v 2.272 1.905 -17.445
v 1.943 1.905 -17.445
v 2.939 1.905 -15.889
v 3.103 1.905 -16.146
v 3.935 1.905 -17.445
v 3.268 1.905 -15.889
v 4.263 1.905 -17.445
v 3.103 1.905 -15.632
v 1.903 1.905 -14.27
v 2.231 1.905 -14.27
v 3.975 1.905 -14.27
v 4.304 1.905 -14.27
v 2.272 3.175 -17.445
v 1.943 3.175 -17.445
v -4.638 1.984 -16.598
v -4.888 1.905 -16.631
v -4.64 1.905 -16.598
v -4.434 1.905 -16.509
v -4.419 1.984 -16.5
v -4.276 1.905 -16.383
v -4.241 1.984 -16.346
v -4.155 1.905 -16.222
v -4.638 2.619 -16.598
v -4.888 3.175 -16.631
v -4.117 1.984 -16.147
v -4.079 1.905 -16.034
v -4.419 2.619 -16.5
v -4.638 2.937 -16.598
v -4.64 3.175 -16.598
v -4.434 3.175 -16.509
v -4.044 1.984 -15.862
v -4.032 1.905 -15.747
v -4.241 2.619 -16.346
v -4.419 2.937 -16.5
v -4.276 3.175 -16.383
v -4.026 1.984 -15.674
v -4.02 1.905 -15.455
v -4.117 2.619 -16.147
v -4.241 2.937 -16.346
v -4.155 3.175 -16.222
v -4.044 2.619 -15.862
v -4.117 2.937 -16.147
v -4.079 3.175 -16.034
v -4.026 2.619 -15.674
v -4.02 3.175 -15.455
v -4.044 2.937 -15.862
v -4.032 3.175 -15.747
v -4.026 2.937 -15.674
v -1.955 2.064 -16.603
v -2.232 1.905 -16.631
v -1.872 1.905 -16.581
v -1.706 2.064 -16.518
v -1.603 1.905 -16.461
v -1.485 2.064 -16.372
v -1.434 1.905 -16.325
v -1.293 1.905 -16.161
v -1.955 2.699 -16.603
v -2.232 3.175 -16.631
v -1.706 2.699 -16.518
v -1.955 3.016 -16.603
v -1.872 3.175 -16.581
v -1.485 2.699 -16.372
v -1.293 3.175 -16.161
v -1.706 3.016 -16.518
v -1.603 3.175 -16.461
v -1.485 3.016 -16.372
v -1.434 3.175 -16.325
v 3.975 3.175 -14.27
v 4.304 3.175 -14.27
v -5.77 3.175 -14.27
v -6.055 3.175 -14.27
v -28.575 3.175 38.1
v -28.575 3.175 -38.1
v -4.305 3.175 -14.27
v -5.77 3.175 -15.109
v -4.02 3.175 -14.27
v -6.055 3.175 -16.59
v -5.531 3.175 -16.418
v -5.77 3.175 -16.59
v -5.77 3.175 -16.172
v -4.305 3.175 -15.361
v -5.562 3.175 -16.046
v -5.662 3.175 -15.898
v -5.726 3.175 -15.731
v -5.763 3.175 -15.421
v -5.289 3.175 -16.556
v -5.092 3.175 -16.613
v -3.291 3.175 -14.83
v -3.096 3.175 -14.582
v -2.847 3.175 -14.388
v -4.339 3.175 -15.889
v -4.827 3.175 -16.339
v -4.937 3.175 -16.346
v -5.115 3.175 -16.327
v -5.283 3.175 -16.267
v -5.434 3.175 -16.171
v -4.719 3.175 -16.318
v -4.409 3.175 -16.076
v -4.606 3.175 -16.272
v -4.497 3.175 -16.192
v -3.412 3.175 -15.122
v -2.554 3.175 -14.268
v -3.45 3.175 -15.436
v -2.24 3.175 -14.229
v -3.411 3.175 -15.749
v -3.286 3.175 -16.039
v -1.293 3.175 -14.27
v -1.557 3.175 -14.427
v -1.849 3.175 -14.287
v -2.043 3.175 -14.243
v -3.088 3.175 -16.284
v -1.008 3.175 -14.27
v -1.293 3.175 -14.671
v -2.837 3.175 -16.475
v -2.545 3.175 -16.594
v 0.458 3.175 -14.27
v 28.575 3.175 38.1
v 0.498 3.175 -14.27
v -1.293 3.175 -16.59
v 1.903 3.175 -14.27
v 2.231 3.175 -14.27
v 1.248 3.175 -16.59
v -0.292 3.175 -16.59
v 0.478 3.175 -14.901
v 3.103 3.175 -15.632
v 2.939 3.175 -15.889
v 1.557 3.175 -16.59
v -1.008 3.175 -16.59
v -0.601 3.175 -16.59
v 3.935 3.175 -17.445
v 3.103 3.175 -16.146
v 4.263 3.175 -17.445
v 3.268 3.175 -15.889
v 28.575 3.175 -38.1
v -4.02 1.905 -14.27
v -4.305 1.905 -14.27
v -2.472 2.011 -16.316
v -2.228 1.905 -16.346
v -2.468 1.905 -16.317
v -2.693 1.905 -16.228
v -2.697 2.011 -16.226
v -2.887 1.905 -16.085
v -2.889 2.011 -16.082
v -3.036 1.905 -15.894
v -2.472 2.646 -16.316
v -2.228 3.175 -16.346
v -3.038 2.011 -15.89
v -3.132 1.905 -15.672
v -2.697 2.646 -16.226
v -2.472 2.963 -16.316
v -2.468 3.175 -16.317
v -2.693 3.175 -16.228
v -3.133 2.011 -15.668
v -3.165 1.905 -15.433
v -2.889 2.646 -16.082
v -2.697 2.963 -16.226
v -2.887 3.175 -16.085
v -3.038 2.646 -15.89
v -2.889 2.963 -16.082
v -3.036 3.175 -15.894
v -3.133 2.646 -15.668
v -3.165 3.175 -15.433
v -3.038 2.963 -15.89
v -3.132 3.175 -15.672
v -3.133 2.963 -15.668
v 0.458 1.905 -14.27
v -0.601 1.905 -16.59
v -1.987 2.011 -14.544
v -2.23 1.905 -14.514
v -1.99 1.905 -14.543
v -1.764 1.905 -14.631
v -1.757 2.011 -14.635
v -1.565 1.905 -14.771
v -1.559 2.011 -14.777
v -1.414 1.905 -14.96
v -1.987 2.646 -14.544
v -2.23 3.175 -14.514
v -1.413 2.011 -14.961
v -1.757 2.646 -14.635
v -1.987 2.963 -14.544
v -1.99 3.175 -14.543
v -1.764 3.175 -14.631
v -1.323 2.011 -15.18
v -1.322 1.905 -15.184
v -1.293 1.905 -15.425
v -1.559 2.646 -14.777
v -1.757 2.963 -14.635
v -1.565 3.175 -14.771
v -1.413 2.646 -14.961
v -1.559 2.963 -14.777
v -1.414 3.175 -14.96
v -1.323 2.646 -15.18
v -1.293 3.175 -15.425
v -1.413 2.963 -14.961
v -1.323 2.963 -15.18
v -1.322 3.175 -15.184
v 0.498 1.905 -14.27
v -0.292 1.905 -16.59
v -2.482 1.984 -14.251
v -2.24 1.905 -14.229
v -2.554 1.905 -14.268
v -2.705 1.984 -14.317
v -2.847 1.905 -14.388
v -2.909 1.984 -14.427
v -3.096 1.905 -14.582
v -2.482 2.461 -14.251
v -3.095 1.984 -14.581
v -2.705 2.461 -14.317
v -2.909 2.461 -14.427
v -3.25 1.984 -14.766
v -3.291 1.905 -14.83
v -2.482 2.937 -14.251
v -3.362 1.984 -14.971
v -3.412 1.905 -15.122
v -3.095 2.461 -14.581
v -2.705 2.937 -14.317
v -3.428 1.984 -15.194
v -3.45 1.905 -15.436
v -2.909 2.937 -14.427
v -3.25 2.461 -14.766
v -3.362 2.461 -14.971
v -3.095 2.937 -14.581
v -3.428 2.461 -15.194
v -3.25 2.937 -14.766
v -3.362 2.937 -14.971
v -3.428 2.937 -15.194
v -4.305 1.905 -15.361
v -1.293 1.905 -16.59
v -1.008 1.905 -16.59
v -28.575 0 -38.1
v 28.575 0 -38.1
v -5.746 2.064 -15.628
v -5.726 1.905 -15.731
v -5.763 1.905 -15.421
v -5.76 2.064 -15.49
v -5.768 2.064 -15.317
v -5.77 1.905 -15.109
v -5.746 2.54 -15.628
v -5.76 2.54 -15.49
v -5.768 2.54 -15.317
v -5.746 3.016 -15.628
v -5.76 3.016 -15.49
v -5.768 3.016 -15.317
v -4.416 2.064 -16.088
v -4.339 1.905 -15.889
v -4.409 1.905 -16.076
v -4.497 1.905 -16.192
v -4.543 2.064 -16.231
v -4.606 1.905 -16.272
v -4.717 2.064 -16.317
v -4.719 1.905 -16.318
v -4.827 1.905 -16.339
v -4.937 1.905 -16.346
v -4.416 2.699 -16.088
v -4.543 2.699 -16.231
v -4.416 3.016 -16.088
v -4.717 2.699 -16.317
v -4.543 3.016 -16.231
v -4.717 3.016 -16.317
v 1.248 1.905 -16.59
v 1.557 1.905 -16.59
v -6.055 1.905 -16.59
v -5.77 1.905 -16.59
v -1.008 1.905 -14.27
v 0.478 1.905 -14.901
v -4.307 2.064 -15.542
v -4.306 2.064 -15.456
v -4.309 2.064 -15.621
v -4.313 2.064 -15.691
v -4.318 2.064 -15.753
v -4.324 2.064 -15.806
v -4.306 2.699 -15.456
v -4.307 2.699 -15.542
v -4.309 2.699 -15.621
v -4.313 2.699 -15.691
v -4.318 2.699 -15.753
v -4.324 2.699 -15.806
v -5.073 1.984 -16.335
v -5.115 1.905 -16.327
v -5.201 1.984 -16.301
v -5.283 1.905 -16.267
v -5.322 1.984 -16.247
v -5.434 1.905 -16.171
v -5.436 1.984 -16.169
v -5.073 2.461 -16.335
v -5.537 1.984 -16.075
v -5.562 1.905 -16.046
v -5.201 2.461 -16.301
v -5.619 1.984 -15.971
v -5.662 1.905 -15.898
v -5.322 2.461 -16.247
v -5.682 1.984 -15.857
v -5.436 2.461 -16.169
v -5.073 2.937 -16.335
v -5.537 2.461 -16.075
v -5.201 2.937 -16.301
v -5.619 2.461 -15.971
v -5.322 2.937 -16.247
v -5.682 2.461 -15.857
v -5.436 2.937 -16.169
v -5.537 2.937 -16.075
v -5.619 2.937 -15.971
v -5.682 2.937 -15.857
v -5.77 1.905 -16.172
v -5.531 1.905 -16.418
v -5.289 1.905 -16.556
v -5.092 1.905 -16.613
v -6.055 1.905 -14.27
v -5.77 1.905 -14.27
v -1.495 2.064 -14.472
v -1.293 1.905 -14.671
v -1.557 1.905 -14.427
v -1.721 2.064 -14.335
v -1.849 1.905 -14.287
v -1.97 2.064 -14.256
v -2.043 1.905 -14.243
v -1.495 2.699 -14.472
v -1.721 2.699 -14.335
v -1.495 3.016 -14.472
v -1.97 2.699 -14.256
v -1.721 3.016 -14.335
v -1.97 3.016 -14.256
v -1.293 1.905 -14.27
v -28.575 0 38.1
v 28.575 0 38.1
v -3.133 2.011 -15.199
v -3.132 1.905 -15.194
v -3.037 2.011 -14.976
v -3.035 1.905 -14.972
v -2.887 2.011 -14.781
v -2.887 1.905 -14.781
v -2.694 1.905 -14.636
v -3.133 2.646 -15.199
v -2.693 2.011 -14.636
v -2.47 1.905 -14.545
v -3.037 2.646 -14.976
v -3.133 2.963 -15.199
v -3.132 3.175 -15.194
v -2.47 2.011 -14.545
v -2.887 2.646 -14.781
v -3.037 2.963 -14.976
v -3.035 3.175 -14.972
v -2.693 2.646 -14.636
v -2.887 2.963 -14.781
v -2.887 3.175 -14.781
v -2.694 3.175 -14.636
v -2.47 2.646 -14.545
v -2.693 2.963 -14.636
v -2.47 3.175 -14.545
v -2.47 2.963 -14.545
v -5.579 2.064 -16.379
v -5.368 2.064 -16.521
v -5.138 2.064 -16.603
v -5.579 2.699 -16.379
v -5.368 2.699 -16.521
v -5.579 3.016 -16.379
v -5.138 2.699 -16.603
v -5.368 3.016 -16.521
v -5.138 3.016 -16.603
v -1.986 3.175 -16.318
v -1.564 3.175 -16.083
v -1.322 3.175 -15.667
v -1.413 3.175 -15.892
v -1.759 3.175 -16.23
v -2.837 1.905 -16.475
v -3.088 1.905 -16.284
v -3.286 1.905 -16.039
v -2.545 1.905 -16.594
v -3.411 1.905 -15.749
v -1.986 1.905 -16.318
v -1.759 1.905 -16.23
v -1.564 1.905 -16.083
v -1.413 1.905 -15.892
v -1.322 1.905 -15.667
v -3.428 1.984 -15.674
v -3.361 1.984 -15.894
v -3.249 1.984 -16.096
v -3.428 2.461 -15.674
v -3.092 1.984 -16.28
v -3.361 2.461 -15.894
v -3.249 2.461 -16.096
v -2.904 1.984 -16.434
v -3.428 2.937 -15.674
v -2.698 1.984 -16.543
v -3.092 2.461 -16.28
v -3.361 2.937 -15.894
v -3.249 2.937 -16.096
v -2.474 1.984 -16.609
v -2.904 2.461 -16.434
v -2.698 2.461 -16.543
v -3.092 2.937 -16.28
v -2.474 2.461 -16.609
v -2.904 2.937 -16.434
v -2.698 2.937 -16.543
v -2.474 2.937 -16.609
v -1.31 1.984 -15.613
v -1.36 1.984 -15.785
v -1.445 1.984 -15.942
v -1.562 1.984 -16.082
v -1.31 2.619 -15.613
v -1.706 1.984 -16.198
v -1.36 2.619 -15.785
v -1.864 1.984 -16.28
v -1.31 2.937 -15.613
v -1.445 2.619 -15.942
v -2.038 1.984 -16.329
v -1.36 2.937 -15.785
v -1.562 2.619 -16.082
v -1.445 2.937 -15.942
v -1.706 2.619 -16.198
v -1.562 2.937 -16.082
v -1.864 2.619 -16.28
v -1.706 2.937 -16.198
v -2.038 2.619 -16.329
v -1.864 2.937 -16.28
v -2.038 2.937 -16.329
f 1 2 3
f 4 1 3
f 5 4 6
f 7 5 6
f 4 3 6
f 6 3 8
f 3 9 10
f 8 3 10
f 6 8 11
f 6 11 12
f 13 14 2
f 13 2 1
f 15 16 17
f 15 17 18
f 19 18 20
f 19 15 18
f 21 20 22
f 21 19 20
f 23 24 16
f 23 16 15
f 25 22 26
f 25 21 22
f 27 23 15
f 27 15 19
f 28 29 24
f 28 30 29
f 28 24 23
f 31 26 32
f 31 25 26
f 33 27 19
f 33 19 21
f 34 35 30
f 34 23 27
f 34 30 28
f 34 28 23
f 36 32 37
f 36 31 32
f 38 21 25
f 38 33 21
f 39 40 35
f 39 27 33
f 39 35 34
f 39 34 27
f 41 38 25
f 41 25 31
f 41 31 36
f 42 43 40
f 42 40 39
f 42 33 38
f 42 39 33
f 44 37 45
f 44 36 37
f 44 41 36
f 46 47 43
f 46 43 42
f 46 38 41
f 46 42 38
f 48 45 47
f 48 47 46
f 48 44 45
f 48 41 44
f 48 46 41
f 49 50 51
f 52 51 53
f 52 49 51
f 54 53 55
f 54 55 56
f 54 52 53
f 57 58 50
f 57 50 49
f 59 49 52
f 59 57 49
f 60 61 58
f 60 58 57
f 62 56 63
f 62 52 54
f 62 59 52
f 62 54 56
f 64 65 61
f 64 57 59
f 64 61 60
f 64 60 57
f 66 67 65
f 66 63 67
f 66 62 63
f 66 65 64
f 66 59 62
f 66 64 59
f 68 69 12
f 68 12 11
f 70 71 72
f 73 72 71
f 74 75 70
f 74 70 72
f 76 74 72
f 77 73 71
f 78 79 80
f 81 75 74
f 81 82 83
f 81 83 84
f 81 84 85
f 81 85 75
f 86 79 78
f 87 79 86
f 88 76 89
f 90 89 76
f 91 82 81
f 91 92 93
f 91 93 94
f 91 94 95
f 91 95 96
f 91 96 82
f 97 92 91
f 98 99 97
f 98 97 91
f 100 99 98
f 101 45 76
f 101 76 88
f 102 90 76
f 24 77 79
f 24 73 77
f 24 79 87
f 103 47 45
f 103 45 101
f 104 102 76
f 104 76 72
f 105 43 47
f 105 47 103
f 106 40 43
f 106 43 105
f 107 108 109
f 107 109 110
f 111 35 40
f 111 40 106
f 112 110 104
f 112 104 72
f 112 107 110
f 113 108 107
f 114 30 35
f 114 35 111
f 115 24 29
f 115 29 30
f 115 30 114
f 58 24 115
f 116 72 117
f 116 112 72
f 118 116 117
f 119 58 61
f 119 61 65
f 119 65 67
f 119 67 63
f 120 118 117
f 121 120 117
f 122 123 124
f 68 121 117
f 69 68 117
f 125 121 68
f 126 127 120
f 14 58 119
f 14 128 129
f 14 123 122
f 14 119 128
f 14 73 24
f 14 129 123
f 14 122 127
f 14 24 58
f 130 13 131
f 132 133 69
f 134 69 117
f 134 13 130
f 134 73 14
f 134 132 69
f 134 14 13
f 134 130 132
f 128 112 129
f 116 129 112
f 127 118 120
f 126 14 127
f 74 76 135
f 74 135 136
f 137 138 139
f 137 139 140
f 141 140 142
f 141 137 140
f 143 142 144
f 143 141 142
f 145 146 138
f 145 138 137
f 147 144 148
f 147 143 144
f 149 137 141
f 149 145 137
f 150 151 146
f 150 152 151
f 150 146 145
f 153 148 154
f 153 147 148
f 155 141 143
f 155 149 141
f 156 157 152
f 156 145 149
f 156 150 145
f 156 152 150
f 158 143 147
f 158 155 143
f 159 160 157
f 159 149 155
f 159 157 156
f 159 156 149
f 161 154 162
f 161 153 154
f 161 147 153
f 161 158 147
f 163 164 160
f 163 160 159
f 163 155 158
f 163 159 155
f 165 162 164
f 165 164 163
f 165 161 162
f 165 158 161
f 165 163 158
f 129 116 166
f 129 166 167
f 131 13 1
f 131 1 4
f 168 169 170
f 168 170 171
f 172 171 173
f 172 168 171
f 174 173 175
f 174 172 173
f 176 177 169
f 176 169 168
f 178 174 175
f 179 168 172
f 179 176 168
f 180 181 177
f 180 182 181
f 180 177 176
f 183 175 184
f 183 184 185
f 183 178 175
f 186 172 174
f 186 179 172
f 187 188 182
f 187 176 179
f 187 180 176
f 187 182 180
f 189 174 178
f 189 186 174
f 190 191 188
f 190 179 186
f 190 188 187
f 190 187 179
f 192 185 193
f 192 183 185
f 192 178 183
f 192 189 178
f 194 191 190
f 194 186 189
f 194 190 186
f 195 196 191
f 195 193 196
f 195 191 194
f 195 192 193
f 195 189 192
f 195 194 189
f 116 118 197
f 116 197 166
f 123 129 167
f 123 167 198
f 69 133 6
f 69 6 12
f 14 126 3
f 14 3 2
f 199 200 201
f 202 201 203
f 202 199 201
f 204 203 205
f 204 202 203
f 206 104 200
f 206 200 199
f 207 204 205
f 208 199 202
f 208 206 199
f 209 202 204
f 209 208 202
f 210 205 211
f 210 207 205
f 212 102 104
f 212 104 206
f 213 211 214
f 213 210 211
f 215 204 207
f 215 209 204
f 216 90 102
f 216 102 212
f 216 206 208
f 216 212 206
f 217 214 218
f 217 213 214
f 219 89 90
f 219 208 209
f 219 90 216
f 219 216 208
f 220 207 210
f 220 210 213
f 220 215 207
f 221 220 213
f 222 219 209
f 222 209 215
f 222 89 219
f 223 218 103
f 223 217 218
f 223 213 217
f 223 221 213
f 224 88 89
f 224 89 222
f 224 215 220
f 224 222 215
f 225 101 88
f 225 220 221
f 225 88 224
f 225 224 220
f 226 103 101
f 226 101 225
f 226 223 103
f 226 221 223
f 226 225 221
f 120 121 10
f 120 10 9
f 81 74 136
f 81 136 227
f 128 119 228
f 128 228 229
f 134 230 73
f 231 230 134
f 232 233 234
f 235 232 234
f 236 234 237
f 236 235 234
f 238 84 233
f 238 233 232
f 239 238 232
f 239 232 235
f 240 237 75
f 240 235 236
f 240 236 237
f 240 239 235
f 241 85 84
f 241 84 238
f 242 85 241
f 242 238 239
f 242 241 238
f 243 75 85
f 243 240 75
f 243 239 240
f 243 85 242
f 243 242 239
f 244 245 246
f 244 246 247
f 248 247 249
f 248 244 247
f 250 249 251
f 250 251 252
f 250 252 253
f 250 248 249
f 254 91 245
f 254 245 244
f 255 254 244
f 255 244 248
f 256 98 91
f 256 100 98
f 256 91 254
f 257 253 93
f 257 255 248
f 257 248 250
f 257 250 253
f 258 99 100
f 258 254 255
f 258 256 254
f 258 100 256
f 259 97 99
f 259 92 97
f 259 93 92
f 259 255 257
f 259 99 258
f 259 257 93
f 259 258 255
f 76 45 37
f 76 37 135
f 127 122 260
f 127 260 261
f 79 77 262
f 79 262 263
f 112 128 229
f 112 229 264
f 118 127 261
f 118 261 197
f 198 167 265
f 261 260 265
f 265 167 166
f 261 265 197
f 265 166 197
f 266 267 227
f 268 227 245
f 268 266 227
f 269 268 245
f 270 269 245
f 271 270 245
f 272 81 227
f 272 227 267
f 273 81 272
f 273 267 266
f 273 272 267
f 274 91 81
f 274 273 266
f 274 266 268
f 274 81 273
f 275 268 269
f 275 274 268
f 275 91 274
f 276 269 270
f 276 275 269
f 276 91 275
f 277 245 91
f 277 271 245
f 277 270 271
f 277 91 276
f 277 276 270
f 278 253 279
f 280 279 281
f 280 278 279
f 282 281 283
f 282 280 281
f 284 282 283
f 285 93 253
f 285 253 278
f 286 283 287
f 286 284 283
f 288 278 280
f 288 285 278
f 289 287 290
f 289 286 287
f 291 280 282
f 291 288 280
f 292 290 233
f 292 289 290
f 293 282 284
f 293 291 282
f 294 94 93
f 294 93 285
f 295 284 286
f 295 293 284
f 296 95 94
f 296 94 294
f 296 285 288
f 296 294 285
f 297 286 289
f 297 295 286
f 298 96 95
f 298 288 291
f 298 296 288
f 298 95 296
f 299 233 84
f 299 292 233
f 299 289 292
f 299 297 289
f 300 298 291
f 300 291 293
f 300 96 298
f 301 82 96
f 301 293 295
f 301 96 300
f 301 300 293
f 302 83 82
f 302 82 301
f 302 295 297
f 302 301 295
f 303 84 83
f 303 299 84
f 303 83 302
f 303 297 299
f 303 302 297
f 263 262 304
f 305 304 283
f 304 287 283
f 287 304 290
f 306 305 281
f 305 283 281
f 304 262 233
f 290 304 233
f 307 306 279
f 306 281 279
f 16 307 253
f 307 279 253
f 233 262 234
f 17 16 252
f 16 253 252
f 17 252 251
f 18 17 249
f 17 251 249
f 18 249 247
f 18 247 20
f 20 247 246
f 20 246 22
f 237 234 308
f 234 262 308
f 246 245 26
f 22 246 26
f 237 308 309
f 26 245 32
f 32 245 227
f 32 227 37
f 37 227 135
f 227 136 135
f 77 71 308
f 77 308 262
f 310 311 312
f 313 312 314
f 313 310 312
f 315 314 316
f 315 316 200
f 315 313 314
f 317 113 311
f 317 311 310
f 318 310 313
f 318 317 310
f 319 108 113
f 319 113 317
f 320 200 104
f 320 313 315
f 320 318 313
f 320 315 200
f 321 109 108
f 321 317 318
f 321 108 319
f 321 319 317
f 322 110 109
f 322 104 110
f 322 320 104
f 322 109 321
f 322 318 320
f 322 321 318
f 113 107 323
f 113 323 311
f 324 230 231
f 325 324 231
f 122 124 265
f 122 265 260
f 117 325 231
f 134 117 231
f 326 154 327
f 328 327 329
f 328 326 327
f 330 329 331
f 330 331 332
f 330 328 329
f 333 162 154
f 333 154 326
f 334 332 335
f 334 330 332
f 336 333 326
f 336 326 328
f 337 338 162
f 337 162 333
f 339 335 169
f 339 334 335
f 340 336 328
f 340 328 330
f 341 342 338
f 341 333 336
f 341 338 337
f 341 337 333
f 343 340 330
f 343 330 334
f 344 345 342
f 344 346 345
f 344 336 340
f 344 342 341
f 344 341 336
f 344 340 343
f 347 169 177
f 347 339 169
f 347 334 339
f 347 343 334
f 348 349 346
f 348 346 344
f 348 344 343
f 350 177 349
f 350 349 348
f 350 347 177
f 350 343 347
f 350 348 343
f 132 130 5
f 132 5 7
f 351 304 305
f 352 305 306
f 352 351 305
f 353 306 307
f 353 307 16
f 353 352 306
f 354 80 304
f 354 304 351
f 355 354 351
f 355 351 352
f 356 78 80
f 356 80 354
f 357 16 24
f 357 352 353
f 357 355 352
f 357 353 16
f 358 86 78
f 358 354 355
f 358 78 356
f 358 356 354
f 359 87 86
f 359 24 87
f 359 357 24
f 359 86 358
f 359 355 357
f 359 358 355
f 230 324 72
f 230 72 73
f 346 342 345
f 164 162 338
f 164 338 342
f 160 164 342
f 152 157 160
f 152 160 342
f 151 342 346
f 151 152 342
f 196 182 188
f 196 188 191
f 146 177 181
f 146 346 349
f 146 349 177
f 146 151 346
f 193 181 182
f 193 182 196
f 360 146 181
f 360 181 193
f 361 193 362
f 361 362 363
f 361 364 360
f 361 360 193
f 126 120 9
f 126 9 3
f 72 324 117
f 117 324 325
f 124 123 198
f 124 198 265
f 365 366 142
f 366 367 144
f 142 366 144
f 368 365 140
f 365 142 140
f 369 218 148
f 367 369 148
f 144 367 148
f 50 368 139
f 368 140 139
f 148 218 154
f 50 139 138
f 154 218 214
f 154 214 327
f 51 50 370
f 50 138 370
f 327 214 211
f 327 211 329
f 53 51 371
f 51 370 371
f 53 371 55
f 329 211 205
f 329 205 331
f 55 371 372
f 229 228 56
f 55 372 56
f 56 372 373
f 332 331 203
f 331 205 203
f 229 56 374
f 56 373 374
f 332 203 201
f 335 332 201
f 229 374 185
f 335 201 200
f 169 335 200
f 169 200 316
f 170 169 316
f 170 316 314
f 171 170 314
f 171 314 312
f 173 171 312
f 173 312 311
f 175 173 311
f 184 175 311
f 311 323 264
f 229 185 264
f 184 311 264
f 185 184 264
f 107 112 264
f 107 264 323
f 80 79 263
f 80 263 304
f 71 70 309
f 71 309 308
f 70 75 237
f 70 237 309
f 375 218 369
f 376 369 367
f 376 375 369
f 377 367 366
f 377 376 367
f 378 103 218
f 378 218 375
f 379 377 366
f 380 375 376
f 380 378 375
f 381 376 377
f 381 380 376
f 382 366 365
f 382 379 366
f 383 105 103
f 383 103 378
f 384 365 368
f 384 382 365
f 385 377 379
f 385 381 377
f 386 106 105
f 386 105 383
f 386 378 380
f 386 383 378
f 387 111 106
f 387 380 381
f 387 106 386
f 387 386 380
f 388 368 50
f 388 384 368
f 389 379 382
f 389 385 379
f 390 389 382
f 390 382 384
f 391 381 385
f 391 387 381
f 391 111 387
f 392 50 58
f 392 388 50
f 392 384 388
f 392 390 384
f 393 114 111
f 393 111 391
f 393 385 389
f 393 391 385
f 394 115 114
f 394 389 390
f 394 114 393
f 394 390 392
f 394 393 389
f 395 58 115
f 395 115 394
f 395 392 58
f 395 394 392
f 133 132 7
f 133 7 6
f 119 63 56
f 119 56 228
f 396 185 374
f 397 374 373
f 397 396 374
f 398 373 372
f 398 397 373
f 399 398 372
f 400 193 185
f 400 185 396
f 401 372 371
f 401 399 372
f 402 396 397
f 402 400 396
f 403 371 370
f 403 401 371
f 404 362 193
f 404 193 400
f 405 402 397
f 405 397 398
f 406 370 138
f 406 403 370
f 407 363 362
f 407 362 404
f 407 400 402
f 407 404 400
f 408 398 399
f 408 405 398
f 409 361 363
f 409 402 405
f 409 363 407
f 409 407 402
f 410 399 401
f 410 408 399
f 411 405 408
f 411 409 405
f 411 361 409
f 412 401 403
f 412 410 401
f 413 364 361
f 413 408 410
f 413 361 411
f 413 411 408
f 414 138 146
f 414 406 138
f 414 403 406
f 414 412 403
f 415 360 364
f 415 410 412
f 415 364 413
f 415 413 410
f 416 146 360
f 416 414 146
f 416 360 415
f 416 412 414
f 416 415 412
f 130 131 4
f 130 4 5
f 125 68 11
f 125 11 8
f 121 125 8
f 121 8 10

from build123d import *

# Parameters (mm, degrees)
SKETCH1_W           = 57.15
SKETCH1_H           = 76.2
BOSS_EXTRUDE1_DEPTH = 3.175
CUT_EXTRUDE1_DEPTH  = 1.27


with BuildPart() as part:
    # Sketch1 → Boss-Extrude1 (new body)
    with BuildSketch(Plane(origin=(0, 0, 0), x_dir=(1, 0, 0), z_dir=(0, 1, 0))):
        Rectangle(SKETCH1_W, SKETCH1_H)
    extrude(amount=BOSS_EXTRUDE1_DEPTH)

    # Sketch2 → Cut-Extrude1 (cut)
    # profile 1 of 4: a face of its own
    with BuildSketch(Plane(origin=(0, 3.175, 0), x_dir=(-1, 0, 0), z_dir=(0, 1, 0))):
        with BuildLine():
            Line((6.055318585, -16.590002596), (5.770382688, -16.590002596))
            Line((5.770382688, -16.590002596), (5.770382688, -16.171502996))
            add(Edge.make_bspline(
                [(5.770382688, -16.171502996), (5.740011779, -16.209517079), (5.68116854, -16.283168869), (5.58216602, -16.379210072), (5.478935847, -16.459804005), (5.3698014, -16.523260139), (5.255885696, -16.571252171), (5.137511969, -16.605860082), (5.01403952, -16.626623661), (4.930069938, -16.629335713), (4.88759022, -16.630707724)],
                knots=[0, 0, 0, 0, 1.127869841, 2.185233117, 3.191641716, 4.159226741, 5.10472073, 6.052603964, 7.014823782, 8, 8, 8, 8], degree=3))
            add(Edge.make_bspline(
                [(4.88759022, -16.630707724), (4.844634079, -16.629214017), (4.760516404, -16.626289008), (4.638482352, -16.600515848), (4.523708355, -16.559729658), (4.417729129, -16.502406678), (4.322175382, -16.431236503), (4.239313996, -16.347753357), (4.169631782, -16.252962996), (4.123122139, -16.164236993), (4.093040195, -16.085425579), (4.073271524, -16.0180161), (4.057278247, -15.942883297), (4.04294765, -15.86021293), (4.033387568, -15.769672957), (4.025809426, -15.671479471), (4.020388991, -15.565649476), (4.020173366, -15.492455289), (4.020062175, -15.454711129)],
                knots=[0, 0, 0, 0, 1.235764162, 2.419900973, 3.574701258, 4.732869372, 5.875730734, 6.993815468, 8.107424371, 9.251605764, 9.866123335, 10.534503958, 11.272175692, 12.077112099, 12.949509943, 13.89253218, 14.913238789, 16, 16, 16, 16], degree=3))
            Line((4.020062175, -15.454711129), (4.020062175, -14.269810288))
            Line((4.020062175, -14.269810288), (4.304998072, -14.269810288))
            Line((4.304998072, -14.269810288), (4.304998072, -15.361216538))
            add(Edge.make_bspline(
                [(4.304998072, -15.361216538), (4.305172614, -15.392805516), (4.305506484, -15.453229854), (4.306573304, -15.539742593), (4.30908455, -15.617988608), (4.312758395, -15.688192769), (4.31790085, -15.750098127), (4.323405942, -15.804018032), (4.330082808, -15.849474875), (4.33603676, -15.876838879), (4.338707007, -15.889111169)],
                knots=[0, 0, 0, 0, 1.430803381, 2.736883362, 3.918614142, 4.976458302, 5.92063272, 6.731858525, 7.431260095, 8, 8, 8, 8], degree=3))
            add(Edge.make_bspline(
                [(4.338707007, -15.889111169), (4.348298036, -15.925160767), (4.366708706, -15.994360559), (4.413127221, -16.088064198), (4.470383963, -16.168488135), (4.541323753, -16.233978346), (4.624041324, -16.28496079), (4.718674187, -16.320307963), (4.824242938, -16.342422975), (4.898497037, -16.344624403), (4.937199595, -16.345771826)],
                knots=[0, 0, 0, 0, 1.084232, 2.08126119, 3.027460722, 3.945137793, 4.874029258, 5.839697328, 6.874011781, 8, 8, 8, 8], degree=3))
            add(Edge.make_bspline(
                [(4.937199595, -16.345771826), (4.960123112, -16.345346396), (5.005488159, -16.344504481), (5.072721891, -16.335837862), (5.13814421, -16.32215003), (5.201579846, -16.301932164), (5.263156997, -16.277350064), (5.323130484, -16.247186672), (5.380662305, -16.210701491), (5.436561438, -16.1696921), (5.488517318, -16.124022995), (5.537550393, -16.076530302), (5.580632017, -16.025225386), (5.619738091, -15.971922216), (5.653454407, -15.915550043), (5.682896587, -15.856711455), (5.707874702, -15.79531338), (5.720286952, -15.752700383), (5.726497471, -15.731378798)],
                knots=[0, 0, 0, 0, 1.023939463, 2.026349741, 3.024227553, 4.007104963, 4.997624259, 5.984875705, 7.002218968, 8.038748769, 9.079772093, 10.091408226, 11.086177727, 12.069739863, 13.043026652, 14.017557731, 15.008077027, 16, 16, 16, 16], degree=3))
            add(Edge.make_bspline(
                [(5.726497471, -15.731378798), (5.730071296, -15.715725863), (5.737851324, -15.681650245), (5.746254351, -15.62572995), (5.753881223, -15.561041615), (5.76026475, -15.487660728), (5.764170378, -15.40533037), (5.768428866, -15.314402145), (5.769979229, -15.214513481), (5.770244435, -15.144970374), (5.770382688, -15.10871754)],
                knots=[0, 0, 0, 0, 0.615963638, 1.340920617, 2.168419149, 3.115676021, 4.16674242, 5.331190069, 6.6087489, 8, 8, 8, 8], degree=3))
            Line((5.770382688, -15.10871754), (5.770382688, -14.269810288))
            Line((5.770382688, -14.269810288), (6.055318585, -14.269810288))
            Line((6.055318585, -14.269810288), (6.055318585, -16.590002596))
        make_face()
    # profile 2 of 4: a face of its own
    with BuildSketch(Plane(origin=(0, 3.175, 0), x_dir=(-1, 0, 0), z_dir=(0, 1, 0))):
        with BuildLine():
            Line((1.007882688, -16.590002596), (1.007882688, -14.269810288))
            Line((1.007882688, -14.269810288), (1.292818585, -14.269810288))
            Line((1.292818585, -14.269810288), (1.292818585, -14.671137411))
            add(Edge.make_bspline(
                [(1.292818585, -14.671137411), (1.324992017, -14.63486586), (1.387872244, -14.563976207), (1.491888052, -14.470793448), (1.603055633, -14.394714311), (1.719481041, -14.332960727), (1.842065446, -14.286409707), (1.970088917, -14.25361509), (2.103451285, -14.232281726), (2.194397192, -14.230173515), (2.240484851, -14.22910516)],
                knots=[0, 0, 0, 0, 1.074235403, 2.099501444, 3.086304576, 4.053325556, 5.01427503, 5.985443889, 6.979105517, 8, 8, 8, 8], degree=3))
            add(Edge.make_bspline(
                [(2.240484851, -14.22910516), (2.281458749, -14.23021747), (2.362261091, -14.232410995), (2.481121581, -14.249433739), (2.595511176, -14.276756716), (2.705502779, -14.314802885), (2.810351107, -14.365009415), (2.910646951, -14.425766251), (3.006624386, -14.497409293), (3.09645812, -14.579631484), (3.179287048, -14.668842021), (3.251753995, -14.76427022), (3.313172092, -14.864605375), (3.363646768, -14.969819287), (3.402706719, -15.079835045), (3.429881876, -15.194577175), (3.446886276, -15.313854753), (3.44907869, -15.395080238), (3.45019038, -15.436266618)],
                knots=[0, 0, 0, 0, 1.034036272, 2.039165313, 3.024406509, 3.999331371, 4.971254918, 5.953351348, 6.95522652, 7.989525907, 9.023492927, 10.024309745, 11.009187477, 11.988246066, 12.964946762, 13.950187958, 14.960617622, 16, 16, 16, 16], degree=3))
            add(Edge.make_bspline(
                [(3.45019038, -15.436266618), (3.449054033, -15.476601721), (3.446807536, -15.556342044), (3.430063828, -15.673613807), (3.401929041, -15.78657883), (3.362370202, -15.894818649), (3.311868686, -15.998769181), (3.249394337, -16.097617116), (3.176953503, -16.192874548), (3.093239343, -16.281486741), (3.002599318, -16.363041853), (2.9060849, -16.434859002), (2.804899525, -16.495460062), (2.698840305, -16.544722833), (2.58865823, -16.583870029), (2.473516308, -16.611159395), (2.353938157, -16.627201173), (2.272758349, -16.629527643), (2.231580605, -16.630707724)],
                knots=[0, 0, 0, 0, 1.02050356, 2.017480486, 2.990790918, 3.96161403, 4.928589988, 5.909588639, 6.91611943, 7.952353252, 8.989586576, 9.99823133, 10.991940466, 11.968822692, 12.952985106, 13.945868367, 14.958059758, 16, 16, 16, 16], degree=3))
            add(Edge.make_bspline(
                [(2.231580605, -16.630707724), (2.18422693, -16.629408375), (2.09136861, -16.626860413), (1.955354868, -16.605475308), (1.826625065, -16.569681193), (1.7040642, -16.520825915), (1.589394651, -16.455035241), (1.481514052, -16.373630088), (1.381702446, -16.274636931), (1.322959063, -16.199329814), (1.292818585, -16.160690697)],
                knots=[0, 0, 0, 0, 1.038908319, 2.037250181, 3.012632028, 3.966567879, 4.9252131, 5.905168122, 6.925168603, 8, 8, 8, 8], degree=3))
            Line((1.292818585, -16.160690697), (1.292818585, -16.590002596))
            Line((1.292818585, -16.590002596), (1.007882688, -16.590002596))
        make_face()
        with BuildLine():
            add(Edge.make_bspline(
                [(2.227764499, -16.345771826), (2.269414491, -16.344288631), (2.351624951, -16.34136104), (2.472327468, -16.318543194), (2.587771574, -16.28047983), (2.697769535, -16.228723763), (2.799284509, -16.162425838), (2.891515583, -16.084255444), (2.971962531, -15.993254844), (3.039982689, -15.891514792), (3.096452027, -15.783098406), (3.135420255, -15.668939236), (3.161303129, -15.552122774), (3.163933935, -15.472868592), (3.165254483, -15.43308653)],
                knots=[0, 0, 0, 0, 1.031179624, 2.035384561, 3.030098214, 4.035455833, 5.037557836, 6.024646278, 7.02156144, 8.035264006, 9.049836703, 10.039645228, 11.015989397, 12, 12, 12, 12], degree=3))
            add(Edge.make_bspline(
                [(3.165254483, -15.43308653), (3.163540249, -15.393551932), (3.160118502, -15.3146377), (3.136215415, -15.197642221), (3.094258569, -15.08422785), (3.039024474, -14.974413926), (2.969933592, -14.871915003), (2.889645422, -14.779234125), (2.79694635, -14.699858737), (2.694537475, -14.633373426), (2.585275386, -14.579891334), (2.47033249, -14.542170246), (2.351712204, -14.518353481), (2.270912571, -14.515483367), (2.230308569, -14.514041057)],
                knots=[0, 0, 0, 0, 0.979235476, 1.954632679, 2.943119654, 3.967171814, 4.992637064, 5.997548408, 6.995574264, 8.005058949, 9.015076297, 9.999929117, 10.994910263, 12, 12, 12, 12], degree=3))
            add(Edge.make_bspline(
                [(2.230308569, -14.514041057), (2.189082755, -14.51554163), (2.107297234, -14.51851853), (1.986177363, -14.541493739), (1.868854415, -14.580029732), (1.756283853, -14.632504372), (1.651593001, -14.697560163), (1.558068615, -14.774059954), (1.477272541, -14.861666513), (1.41075029, -14.959856368), (1.357599909, -15.066314478), (1.319965408, -15.180022076), (1.297107538, -15.300303471), (1.294268004, -15.382739468), (1.292818585, -15.424818301)],
                knots=[0, 0, 0, 0, 1.017730373, 2.019016736, 3.032373701, 4.060729657, 5.079187105, 6.068726676, 7.03591854, 8.011858086, 8.988317194, 9.965225429, 10.961364673, 12, 12, 12, 12], degree=3))
            add(Edge.make_bspline(
                [(1.292818585, -15.424818301), (1.293689144, -15.456874749), (1.29540268, -15.519971983), (1.308493072, -15.612616408), (1.329317189, -15.701274213), (1.358657167, -15.786042436), (1.397212571, -15.8664383), (1.443664912, -15.943091998), (1.498966997, -16.015289511), (1.561435842, -16.082939407), (1.630584648, -16.14433424), (1.704115441, -16.198447131), (1.781843219, -16.244241527), (1.863713421, -16.280889022), (1.949095477, -16.310744817), (2.038807758, -16.330464053), (2.131946128, -16.344047564), (2.195488753, -16.345191021), (2.227764499, -16.345771826)],
                knots=[0, 0, 0, 0, 1.050062701, 2.066855696, 3.059271411, 4.030305351, 4.999747758, 5.975466543, 6.961907836, 7.974539719, 8.98812422, 9.98710676, 10.961662635, 11.93785114, 12.922015094, 13.919620009, 14.94329489, 16, 16, 16, 16], degree=3))
        make_face(mode=Mode.SUBTRACT)
    # profile 3 of 4: a face of its own
    with BuildSketch(Plane(origin=(0, 3.175, 0), x_dir=(-1, 0, 0), z_dir=(0, 1, 0))):
        Polygon((0.600831406, -16.590002596), (0.292362856, -16.590002596), (-0.477854492, -14.900739775), (-1.248071839, -16.590002596), (-1.556540389, -16.590002596), (-0.498207056, -14.269810288), (-0.457501928, -14.269810288), align=None)
    # profile 4 of 4: a face of its own
    with BuildSketch(Plane(origin=(0, 3.175, 0), x_dir=(-1, 0, 0), z_dir=(0, 1, 0))):
        Polygon((-1.943239107, -17.444810288), (-2.272060221, -17.444810288), (-3.103335261, -16.146062291), (-3.934610301, -17.444810288), (-4.263431415, -17.444810288), (-3.268063827, -15.889111169), (-4.304136543, -14.269810288), (-3.975315429, -14.269810288), (-3.103335261, -15.632160048), (-2.231355093, -14.269810288), (-1.902533979, -14.269810288), (-2.939242713, -15.889111169), align=None)
    extrude(amount=-CUT_EXTRUDE1_DEPTH, mode=Mode.SUBTRACT)


solid = part.part
